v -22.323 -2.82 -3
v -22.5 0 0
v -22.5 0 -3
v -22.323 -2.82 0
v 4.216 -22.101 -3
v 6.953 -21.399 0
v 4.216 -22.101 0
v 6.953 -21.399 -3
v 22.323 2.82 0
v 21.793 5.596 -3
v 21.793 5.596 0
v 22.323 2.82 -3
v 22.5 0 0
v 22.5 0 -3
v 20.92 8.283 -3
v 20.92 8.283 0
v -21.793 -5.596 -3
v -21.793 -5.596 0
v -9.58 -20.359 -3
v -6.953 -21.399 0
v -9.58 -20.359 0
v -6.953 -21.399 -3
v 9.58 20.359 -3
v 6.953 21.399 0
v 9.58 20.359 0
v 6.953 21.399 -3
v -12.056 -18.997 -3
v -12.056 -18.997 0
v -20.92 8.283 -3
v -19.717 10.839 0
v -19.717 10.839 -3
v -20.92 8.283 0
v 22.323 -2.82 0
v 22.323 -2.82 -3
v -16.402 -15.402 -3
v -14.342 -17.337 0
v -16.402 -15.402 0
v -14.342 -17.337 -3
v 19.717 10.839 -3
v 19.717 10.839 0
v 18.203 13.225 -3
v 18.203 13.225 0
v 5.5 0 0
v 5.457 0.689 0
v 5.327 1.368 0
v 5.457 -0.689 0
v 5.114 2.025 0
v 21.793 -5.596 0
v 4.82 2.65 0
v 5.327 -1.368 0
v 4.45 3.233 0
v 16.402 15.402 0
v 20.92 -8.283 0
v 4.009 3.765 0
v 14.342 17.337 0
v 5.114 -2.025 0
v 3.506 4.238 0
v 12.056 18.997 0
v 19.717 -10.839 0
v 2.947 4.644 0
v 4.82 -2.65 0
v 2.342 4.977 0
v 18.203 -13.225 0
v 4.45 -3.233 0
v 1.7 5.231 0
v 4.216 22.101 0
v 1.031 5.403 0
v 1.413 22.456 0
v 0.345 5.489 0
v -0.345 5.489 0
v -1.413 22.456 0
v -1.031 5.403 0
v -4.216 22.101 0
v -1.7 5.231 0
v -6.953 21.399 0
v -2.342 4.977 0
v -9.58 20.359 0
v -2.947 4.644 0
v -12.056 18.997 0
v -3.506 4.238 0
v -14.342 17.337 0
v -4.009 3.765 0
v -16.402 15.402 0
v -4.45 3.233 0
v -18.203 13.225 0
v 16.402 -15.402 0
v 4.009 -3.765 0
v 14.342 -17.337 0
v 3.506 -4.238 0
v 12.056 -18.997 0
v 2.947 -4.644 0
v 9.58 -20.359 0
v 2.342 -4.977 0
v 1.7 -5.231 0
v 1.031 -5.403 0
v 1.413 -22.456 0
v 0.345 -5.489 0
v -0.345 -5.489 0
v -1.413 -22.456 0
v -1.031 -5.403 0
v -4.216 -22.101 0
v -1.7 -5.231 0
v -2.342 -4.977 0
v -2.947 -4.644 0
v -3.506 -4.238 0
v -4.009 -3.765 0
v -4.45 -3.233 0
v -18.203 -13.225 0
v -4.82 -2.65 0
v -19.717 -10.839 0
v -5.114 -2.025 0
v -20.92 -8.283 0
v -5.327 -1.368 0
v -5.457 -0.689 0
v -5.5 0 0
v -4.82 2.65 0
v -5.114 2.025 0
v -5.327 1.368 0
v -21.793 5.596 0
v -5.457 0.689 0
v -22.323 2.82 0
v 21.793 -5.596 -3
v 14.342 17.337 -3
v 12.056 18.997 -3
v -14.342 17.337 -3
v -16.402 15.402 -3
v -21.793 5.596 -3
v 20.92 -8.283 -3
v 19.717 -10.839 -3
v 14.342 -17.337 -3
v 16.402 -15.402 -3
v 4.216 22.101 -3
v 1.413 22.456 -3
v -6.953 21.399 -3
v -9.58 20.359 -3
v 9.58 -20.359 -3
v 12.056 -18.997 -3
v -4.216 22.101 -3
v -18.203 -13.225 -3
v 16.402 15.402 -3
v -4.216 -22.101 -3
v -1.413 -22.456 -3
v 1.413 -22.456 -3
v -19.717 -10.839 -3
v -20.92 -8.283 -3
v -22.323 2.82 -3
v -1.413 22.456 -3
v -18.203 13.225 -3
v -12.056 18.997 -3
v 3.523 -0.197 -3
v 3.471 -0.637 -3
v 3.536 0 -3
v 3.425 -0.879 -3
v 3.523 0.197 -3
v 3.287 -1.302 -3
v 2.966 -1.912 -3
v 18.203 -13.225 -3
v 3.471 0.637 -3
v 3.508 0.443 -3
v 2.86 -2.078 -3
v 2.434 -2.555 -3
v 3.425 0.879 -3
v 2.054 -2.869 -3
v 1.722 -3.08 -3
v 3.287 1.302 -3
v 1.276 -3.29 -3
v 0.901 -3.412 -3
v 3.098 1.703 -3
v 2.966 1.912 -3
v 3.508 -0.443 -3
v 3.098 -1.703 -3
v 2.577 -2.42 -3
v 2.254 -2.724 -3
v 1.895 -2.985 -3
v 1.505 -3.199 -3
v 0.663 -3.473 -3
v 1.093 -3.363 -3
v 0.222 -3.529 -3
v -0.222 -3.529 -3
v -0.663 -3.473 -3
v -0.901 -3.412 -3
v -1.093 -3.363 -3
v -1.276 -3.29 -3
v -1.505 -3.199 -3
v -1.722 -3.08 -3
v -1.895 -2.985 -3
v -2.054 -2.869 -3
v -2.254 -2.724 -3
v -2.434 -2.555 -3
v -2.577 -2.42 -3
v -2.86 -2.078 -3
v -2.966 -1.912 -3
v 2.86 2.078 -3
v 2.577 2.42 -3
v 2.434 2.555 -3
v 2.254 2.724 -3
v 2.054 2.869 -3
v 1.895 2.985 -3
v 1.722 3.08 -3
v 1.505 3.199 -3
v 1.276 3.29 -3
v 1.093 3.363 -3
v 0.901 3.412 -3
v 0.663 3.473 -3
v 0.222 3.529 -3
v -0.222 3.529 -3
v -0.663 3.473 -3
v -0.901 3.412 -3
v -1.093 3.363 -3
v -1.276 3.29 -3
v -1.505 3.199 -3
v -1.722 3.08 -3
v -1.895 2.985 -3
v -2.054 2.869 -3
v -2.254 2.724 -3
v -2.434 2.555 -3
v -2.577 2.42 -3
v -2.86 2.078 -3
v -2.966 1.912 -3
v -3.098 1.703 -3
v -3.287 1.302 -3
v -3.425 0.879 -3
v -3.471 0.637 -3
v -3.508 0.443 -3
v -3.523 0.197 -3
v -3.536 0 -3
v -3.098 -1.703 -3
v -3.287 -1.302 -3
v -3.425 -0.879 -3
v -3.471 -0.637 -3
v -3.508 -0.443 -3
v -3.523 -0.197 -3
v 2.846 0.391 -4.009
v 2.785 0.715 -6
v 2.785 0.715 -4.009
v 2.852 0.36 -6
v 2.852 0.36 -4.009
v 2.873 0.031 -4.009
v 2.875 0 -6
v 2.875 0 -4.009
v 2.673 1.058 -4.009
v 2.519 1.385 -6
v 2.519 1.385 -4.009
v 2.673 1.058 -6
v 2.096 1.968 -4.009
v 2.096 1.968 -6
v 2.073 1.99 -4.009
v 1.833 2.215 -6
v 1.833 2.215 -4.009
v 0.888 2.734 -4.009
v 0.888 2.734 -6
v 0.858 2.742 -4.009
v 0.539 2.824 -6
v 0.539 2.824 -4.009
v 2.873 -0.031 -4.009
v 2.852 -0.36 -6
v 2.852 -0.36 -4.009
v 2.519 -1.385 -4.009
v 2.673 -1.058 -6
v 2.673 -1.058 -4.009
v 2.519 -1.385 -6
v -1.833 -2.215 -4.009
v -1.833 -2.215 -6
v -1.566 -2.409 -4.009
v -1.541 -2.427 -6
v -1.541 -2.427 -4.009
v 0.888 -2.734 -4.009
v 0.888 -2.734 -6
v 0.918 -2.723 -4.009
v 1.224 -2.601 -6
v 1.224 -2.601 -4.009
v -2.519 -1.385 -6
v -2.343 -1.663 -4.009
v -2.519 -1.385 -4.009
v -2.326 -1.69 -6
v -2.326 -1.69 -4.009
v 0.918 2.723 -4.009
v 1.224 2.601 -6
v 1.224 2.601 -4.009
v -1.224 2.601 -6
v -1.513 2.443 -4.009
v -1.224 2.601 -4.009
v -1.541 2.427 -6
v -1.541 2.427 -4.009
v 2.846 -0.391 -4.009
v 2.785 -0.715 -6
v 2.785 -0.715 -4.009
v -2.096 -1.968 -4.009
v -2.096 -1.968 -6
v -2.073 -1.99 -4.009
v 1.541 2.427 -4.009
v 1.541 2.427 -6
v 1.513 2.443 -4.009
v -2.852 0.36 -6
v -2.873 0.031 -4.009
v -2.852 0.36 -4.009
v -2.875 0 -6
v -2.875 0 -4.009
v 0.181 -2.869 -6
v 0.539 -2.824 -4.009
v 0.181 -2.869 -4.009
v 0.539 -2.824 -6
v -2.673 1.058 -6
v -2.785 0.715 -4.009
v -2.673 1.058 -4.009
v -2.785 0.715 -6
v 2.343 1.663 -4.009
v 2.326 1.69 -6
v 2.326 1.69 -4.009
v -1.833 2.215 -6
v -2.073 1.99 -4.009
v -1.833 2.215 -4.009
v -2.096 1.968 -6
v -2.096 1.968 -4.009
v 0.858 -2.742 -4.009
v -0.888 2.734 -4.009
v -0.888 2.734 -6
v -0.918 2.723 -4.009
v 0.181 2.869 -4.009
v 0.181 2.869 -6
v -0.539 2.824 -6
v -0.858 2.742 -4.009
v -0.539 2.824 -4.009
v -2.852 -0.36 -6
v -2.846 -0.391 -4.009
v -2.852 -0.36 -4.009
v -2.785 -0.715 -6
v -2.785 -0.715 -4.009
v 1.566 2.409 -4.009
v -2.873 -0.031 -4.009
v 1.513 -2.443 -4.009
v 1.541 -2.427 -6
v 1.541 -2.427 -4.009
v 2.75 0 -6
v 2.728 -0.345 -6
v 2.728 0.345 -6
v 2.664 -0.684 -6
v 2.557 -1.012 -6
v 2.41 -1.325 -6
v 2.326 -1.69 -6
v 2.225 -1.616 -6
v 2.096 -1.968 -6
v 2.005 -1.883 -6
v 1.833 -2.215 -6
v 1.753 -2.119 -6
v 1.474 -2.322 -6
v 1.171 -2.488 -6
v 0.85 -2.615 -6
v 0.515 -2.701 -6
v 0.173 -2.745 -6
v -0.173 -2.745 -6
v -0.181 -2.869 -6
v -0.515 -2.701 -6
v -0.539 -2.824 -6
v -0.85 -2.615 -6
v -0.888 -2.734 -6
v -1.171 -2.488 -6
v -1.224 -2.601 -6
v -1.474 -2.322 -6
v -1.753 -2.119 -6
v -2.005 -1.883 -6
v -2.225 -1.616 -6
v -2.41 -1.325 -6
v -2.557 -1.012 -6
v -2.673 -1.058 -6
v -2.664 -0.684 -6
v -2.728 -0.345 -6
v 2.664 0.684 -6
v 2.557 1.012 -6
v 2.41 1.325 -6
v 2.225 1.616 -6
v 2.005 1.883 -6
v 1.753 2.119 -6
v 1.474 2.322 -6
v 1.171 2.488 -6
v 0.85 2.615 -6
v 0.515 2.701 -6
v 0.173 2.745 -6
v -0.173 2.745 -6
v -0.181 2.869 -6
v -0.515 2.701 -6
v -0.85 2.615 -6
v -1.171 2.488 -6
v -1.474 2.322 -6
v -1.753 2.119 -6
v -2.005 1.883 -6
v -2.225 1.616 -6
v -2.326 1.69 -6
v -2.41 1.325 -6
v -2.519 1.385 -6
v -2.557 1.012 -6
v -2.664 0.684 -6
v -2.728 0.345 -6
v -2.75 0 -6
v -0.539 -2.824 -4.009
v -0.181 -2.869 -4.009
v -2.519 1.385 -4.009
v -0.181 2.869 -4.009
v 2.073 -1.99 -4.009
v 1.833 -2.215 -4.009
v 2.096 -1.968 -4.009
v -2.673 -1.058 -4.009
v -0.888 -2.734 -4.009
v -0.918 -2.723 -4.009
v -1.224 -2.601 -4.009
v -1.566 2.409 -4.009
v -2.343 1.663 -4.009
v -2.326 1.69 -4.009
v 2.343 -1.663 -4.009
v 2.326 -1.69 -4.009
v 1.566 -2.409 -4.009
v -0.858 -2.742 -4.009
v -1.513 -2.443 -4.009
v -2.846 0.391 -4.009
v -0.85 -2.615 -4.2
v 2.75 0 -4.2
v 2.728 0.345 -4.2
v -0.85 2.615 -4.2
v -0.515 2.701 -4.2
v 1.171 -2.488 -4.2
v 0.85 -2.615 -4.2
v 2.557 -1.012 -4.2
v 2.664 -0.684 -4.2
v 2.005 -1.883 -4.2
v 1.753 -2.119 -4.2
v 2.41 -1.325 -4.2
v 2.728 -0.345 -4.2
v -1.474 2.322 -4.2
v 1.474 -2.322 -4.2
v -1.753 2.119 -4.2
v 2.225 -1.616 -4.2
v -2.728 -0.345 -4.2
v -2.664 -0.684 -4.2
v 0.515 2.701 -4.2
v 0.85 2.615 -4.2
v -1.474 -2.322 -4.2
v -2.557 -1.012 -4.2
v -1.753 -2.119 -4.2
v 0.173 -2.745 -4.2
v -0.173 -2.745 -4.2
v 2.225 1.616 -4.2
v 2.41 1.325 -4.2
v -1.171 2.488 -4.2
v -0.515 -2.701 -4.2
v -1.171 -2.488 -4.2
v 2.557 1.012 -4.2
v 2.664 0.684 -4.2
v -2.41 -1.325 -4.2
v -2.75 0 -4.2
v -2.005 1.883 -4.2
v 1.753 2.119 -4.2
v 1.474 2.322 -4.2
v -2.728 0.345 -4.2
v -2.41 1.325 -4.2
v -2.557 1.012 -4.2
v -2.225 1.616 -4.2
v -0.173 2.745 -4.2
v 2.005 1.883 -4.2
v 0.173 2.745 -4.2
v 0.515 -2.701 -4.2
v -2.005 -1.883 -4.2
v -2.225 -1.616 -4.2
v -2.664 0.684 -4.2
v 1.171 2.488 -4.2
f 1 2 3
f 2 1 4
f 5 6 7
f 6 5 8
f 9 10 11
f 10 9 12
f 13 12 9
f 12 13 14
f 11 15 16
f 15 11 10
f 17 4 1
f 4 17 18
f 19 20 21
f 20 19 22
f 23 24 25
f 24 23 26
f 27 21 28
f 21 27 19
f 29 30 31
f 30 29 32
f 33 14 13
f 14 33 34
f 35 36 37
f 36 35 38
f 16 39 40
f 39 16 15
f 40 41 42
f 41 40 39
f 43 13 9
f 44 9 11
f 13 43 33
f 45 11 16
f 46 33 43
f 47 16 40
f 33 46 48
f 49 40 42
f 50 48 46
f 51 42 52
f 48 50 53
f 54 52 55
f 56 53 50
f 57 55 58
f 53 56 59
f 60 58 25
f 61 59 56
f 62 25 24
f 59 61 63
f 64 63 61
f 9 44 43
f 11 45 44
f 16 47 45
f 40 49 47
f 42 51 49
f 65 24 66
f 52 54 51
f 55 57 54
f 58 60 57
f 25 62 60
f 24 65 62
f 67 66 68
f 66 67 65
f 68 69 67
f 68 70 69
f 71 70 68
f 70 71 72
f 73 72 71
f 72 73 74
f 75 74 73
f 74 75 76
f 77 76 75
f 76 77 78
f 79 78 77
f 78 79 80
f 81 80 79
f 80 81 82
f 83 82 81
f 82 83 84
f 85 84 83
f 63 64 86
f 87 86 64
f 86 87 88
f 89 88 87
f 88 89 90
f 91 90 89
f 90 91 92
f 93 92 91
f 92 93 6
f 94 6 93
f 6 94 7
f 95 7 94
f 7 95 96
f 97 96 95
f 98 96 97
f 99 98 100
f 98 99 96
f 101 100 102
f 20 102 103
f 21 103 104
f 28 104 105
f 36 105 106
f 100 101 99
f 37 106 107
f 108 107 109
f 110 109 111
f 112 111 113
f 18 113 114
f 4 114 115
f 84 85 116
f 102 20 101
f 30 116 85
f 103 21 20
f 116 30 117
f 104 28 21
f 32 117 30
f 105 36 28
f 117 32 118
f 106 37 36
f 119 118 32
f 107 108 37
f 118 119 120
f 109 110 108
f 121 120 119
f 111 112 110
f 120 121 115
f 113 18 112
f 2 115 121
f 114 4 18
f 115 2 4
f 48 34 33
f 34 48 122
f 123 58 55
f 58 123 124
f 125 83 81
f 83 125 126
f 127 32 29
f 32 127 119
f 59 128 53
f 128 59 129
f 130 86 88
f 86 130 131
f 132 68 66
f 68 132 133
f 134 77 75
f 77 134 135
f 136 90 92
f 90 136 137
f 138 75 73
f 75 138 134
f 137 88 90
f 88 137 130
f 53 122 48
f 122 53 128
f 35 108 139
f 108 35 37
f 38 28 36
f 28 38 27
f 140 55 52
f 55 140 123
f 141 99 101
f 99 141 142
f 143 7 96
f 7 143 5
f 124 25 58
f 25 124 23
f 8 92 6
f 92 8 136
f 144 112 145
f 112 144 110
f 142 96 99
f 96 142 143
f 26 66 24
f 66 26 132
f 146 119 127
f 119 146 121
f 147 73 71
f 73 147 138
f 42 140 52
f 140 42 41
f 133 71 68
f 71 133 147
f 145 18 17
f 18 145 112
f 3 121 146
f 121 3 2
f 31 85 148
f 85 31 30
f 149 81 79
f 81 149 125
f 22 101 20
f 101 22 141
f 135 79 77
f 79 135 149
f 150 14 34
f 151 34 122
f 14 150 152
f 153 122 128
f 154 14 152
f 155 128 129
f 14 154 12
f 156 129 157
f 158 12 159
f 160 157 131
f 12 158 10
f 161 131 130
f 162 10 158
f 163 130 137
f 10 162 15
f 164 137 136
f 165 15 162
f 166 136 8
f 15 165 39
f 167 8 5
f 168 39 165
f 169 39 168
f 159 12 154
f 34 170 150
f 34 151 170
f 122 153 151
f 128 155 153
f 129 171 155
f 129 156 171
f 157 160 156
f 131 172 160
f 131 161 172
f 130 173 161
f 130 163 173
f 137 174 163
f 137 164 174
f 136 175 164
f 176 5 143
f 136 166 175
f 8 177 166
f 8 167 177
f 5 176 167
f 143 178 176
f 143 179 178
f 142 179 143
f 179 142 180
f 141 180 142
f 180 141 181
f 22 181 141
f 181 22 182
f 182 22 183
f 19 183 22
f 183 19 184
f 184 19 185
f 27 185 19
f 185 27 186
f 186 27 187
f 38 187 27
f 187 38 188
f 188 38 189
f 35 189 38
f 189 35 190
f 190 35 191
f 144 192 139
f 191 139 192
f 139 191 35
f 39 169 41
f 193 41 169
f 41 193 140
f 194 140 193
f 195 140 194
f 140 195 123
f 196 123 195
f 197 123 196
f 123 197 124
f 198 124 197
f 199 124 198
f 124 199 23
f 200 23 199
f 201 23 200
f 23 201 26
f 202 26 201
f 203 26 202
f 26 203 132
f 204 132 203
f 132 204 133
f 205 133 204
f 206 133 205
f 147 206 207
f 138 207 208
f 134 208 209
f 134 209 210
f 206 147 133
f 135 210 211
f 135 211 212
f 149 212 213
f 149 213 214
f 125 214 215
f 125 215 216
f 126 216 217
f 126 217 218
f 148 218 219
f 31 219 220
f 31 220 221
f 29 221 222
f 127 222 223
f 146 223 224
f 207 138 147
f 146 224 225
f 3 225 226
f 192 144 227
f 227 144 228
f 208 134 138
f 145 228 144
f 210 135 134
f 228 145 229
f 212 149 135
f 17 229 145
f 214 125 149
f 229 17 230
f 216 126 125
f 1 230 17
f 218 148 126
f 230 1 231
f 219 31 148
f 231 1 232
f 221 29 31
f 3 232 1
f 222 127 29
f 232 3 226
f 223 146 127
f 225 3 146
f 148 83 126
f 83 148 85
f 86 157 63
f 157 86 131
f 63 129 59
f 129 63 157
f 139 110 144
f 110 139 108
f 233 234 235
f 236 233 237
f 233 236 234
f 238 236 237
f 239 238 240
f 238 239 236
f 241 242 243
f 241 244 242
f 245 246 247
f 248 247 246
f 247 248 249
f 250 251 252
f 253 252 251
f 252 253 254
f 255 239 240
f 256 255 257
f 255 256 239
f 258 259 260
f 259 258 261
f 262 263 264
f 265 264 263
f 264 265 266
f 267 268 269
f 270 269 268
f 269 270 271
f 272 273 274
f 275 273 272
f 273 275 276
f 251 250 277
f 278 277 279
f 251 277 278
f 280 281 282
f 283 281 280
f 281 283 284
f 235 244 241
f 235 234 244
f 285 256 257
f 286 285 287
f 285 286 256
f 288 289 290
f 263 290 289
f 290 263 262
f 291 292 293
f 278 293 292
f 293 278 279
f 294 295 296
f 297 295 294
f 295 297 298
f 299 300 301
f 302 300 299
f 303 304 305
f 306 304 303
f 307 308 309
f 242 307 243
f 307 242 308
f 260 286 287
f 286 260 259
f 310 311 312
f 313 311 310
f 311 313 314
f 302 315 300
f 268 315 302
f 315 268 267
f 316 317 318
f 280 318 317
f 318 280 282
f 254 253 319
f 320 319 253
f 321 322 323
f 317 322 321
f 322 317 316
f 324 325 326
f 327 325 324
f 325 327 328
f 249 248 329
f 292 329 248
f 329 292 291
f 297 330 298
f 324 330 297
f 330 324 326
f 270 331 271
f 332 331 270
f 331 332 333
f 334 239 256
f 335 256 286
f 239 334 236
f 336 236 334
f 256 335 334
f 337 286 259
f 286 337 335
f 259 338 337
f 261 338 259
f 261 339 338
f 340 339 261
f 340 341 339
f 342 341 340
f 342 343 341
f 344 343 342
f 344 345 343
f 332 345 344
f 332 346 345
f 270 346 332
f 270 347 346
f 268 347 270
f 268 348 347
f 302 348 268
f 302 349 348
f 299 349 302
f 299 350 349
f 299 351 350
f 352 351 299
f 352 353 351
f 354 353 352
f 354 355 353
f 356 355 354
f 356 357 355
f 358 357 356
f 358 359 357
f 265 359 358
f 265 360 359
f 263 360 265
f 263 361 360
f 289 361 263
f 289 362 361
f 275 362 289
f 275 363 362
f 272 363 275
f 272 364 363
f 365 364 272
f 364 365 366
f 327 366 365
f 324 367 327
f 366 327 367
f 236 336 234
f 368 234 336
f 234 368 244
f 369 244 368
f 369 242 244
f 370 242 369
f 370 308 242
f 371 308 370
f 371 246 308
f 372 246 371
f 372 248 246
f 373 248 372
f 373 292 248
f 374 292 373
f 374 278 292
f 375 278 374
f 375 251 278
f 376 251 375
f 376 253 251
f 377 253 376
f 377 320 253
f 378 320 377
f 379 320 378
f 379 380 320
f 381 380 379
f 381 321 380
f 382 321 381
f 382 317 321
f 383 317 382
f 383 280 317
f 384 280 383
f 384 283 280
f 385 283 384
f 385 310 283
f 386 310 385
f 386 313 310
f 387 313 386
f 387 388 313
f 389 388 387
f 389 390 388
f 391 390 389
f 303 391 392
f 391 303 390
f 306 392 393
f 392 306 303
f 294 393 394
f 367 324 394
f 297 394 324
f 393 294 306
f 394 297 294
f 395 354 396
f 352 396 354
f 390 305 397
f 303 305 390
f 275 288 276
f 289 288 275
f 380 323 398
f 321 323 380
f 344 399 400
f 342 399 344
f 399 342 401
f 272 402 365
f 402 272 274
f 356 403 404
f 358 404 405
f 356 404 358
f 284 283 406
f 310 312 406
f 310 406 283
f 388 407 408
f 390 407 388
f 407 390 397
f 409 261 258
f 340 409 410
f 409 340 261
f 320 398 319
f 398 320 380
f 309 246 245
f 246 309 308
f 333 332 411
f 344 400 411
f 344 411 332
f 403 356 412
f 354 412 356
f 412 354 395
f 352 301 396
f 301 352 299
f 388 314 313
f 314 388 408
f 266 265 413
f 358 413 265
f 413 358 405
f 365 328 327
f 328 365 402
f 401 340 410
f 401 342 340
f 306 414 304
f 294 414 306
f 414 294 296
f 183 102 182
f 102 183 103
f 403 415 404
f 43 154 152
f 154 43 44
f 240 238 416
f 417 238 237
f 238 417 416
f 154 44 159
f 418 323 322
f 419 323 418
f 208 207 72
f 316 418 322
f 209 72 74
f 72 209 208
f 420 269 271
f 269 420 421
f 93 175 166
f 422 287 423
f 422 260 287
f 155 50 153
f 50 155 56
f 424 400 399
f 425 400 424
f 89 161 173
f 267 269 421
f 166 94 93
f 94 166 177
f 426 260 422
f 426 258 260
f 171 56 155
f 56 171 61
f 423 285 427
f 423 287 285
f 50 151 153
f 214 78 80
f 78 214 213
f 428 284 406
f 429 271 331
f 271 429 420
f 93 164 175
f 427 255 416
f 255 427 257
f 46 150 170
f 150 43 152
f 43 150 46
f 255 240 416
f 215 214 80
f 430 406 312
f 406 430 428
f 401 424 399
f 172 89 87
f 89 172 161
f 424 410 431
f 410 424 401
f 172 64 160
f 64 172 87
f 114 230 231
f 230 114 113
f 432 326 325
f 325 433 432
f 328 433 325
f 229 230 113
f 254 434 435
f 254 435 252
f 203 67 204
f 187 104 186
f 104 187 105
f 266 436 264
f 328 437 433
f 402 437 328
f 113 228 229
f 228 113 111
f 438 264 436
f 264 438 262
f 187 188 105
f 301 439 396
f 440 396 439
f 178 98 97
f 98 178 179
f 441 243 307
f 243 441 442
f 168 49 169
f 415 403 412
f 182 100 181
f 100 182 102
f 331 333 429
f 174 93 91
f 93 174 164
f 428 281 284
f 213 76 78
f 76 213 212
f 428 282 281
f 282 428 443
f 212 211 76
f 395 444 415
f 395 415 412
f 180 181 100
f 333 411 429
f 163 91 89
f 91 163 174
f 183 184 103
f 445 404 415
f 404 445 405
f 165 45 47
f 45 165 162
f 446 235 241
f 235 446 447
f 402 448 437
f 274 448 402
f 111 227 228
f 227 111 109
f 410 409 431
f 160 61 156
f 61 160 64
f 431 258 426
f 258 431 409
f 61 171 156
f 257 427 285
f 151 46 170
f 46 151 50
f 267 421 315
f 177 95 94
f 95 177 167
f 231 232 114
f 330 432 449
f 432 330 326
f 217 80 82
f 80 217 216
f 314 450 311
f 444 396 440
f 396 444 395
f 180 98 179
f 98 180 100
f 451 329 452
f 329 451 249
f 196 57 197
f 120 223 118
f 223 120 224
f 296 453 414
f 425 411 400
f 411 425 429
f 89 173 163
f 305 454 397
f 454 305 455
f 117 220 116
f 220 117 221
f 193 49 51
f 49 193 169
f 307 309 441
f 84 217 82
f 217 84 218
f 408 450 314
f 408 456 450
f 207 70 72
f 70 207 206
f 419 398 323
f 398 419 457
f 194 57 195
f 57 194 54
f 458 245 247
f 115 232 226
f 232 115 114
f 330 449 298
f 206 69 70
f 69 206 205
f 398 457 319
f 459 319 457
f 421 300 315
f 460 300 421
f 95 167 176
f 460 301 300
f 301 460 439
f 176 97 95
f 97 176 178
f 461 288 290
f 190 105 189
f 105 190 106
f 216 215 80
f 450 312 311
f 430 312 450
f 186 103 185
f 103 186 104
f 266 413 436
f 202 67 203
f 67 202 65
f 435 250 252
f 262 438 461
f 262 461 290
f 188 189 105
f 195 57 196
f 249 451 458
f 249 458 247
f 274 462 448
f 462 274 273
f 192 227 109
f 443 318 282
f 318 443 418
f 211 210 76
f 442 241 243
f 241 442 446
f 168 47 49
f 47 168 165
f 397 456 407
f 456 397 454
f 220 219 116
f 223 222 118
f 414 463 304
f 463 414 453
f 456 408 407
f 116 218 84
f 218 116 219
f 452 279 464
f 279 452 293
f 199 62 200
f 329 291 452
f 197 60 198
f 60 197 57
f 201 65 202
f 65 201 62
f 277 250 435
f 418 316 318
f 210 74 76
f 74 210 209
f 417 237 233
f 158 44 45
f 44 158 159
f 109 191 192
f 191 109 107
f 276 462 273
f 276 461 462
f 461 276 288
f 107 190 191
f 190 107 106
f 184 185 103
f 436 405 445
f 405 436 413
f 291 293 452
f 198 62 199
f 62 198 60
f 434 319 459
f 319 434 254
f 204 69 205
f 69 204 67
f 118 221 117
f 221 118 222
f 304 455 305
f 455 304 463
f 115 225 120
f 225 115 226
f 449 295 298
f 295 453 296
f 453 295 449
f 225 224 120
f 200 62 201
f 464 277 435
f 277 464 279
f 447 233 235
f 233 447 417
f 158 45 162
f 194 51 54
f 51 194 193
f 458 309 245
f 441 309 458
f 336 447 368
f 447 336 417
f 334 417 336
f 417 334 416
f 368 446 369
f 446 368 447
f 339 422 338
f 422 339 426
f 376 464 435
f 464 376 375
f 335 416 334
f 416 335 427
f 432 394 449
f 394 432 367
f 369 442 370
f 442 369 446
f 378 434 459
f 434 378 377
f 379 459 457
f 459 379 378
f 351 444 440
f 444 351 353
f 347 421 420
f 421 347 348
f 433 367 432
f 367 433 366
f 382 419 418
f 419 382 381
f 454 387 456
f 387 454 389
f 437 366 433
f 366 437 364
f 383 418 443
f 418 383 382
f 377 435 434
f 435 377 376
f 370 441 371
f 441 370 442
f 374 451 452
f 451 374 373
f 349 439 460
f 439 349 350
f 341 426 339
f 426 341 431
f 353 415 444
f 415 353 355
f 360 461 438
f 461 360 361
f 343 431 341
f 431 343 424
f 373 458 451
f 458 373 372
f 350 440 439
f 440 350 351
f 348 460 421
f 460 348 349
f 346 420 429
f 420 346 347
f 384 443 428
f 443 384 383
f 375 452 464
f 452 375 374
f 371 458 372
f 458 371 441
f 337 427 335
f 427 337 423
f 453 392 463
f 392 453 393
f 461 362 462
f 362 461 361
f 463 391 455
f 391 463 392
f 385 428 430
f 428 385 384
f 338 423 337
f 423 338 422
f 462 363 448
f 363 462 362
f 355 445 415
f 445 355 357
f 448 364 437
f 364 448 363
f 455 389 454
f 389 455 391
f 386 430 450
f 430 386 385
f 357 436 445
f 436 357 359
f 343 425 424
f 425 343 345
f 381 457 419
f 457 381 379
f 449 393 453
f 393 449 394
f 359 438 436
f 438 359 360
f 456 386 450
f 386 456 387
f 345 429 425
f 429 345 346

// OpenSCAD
$fn = 50;

difference() {
	union() {
		translate(v = [0, 0, -3.0]) {
			cylinder(h = 3, r = 22.5);
		}
		#translate(v = [0, 0, -6.0]) {
			cylinder(h = 6, r = 2.875);
		}
	}
	union() {
		translate(v = [0, 0, 0]) {
			rotate(a = [0, 0, 0]) {
				difference() {
					union() {
						translate(v = [0, 0, -6.0]) {
							cylinder(h = 6, r = 2.25);
						}
						translate(v = [0, 0, -4.2]) {
							cylinder(h = 4.2, r1 = 2.75, r2 = 5.5);
						}
						translate(v = [0, 0, -6.0]) {
							cylinder(h = 6, r = 2.75);
						}
						translate(v = [0, 0, -6.0]) {
							cylinder(h = 6, r = 2.25);
						}
					}
					union();
				}
			}
		}
	}
}
